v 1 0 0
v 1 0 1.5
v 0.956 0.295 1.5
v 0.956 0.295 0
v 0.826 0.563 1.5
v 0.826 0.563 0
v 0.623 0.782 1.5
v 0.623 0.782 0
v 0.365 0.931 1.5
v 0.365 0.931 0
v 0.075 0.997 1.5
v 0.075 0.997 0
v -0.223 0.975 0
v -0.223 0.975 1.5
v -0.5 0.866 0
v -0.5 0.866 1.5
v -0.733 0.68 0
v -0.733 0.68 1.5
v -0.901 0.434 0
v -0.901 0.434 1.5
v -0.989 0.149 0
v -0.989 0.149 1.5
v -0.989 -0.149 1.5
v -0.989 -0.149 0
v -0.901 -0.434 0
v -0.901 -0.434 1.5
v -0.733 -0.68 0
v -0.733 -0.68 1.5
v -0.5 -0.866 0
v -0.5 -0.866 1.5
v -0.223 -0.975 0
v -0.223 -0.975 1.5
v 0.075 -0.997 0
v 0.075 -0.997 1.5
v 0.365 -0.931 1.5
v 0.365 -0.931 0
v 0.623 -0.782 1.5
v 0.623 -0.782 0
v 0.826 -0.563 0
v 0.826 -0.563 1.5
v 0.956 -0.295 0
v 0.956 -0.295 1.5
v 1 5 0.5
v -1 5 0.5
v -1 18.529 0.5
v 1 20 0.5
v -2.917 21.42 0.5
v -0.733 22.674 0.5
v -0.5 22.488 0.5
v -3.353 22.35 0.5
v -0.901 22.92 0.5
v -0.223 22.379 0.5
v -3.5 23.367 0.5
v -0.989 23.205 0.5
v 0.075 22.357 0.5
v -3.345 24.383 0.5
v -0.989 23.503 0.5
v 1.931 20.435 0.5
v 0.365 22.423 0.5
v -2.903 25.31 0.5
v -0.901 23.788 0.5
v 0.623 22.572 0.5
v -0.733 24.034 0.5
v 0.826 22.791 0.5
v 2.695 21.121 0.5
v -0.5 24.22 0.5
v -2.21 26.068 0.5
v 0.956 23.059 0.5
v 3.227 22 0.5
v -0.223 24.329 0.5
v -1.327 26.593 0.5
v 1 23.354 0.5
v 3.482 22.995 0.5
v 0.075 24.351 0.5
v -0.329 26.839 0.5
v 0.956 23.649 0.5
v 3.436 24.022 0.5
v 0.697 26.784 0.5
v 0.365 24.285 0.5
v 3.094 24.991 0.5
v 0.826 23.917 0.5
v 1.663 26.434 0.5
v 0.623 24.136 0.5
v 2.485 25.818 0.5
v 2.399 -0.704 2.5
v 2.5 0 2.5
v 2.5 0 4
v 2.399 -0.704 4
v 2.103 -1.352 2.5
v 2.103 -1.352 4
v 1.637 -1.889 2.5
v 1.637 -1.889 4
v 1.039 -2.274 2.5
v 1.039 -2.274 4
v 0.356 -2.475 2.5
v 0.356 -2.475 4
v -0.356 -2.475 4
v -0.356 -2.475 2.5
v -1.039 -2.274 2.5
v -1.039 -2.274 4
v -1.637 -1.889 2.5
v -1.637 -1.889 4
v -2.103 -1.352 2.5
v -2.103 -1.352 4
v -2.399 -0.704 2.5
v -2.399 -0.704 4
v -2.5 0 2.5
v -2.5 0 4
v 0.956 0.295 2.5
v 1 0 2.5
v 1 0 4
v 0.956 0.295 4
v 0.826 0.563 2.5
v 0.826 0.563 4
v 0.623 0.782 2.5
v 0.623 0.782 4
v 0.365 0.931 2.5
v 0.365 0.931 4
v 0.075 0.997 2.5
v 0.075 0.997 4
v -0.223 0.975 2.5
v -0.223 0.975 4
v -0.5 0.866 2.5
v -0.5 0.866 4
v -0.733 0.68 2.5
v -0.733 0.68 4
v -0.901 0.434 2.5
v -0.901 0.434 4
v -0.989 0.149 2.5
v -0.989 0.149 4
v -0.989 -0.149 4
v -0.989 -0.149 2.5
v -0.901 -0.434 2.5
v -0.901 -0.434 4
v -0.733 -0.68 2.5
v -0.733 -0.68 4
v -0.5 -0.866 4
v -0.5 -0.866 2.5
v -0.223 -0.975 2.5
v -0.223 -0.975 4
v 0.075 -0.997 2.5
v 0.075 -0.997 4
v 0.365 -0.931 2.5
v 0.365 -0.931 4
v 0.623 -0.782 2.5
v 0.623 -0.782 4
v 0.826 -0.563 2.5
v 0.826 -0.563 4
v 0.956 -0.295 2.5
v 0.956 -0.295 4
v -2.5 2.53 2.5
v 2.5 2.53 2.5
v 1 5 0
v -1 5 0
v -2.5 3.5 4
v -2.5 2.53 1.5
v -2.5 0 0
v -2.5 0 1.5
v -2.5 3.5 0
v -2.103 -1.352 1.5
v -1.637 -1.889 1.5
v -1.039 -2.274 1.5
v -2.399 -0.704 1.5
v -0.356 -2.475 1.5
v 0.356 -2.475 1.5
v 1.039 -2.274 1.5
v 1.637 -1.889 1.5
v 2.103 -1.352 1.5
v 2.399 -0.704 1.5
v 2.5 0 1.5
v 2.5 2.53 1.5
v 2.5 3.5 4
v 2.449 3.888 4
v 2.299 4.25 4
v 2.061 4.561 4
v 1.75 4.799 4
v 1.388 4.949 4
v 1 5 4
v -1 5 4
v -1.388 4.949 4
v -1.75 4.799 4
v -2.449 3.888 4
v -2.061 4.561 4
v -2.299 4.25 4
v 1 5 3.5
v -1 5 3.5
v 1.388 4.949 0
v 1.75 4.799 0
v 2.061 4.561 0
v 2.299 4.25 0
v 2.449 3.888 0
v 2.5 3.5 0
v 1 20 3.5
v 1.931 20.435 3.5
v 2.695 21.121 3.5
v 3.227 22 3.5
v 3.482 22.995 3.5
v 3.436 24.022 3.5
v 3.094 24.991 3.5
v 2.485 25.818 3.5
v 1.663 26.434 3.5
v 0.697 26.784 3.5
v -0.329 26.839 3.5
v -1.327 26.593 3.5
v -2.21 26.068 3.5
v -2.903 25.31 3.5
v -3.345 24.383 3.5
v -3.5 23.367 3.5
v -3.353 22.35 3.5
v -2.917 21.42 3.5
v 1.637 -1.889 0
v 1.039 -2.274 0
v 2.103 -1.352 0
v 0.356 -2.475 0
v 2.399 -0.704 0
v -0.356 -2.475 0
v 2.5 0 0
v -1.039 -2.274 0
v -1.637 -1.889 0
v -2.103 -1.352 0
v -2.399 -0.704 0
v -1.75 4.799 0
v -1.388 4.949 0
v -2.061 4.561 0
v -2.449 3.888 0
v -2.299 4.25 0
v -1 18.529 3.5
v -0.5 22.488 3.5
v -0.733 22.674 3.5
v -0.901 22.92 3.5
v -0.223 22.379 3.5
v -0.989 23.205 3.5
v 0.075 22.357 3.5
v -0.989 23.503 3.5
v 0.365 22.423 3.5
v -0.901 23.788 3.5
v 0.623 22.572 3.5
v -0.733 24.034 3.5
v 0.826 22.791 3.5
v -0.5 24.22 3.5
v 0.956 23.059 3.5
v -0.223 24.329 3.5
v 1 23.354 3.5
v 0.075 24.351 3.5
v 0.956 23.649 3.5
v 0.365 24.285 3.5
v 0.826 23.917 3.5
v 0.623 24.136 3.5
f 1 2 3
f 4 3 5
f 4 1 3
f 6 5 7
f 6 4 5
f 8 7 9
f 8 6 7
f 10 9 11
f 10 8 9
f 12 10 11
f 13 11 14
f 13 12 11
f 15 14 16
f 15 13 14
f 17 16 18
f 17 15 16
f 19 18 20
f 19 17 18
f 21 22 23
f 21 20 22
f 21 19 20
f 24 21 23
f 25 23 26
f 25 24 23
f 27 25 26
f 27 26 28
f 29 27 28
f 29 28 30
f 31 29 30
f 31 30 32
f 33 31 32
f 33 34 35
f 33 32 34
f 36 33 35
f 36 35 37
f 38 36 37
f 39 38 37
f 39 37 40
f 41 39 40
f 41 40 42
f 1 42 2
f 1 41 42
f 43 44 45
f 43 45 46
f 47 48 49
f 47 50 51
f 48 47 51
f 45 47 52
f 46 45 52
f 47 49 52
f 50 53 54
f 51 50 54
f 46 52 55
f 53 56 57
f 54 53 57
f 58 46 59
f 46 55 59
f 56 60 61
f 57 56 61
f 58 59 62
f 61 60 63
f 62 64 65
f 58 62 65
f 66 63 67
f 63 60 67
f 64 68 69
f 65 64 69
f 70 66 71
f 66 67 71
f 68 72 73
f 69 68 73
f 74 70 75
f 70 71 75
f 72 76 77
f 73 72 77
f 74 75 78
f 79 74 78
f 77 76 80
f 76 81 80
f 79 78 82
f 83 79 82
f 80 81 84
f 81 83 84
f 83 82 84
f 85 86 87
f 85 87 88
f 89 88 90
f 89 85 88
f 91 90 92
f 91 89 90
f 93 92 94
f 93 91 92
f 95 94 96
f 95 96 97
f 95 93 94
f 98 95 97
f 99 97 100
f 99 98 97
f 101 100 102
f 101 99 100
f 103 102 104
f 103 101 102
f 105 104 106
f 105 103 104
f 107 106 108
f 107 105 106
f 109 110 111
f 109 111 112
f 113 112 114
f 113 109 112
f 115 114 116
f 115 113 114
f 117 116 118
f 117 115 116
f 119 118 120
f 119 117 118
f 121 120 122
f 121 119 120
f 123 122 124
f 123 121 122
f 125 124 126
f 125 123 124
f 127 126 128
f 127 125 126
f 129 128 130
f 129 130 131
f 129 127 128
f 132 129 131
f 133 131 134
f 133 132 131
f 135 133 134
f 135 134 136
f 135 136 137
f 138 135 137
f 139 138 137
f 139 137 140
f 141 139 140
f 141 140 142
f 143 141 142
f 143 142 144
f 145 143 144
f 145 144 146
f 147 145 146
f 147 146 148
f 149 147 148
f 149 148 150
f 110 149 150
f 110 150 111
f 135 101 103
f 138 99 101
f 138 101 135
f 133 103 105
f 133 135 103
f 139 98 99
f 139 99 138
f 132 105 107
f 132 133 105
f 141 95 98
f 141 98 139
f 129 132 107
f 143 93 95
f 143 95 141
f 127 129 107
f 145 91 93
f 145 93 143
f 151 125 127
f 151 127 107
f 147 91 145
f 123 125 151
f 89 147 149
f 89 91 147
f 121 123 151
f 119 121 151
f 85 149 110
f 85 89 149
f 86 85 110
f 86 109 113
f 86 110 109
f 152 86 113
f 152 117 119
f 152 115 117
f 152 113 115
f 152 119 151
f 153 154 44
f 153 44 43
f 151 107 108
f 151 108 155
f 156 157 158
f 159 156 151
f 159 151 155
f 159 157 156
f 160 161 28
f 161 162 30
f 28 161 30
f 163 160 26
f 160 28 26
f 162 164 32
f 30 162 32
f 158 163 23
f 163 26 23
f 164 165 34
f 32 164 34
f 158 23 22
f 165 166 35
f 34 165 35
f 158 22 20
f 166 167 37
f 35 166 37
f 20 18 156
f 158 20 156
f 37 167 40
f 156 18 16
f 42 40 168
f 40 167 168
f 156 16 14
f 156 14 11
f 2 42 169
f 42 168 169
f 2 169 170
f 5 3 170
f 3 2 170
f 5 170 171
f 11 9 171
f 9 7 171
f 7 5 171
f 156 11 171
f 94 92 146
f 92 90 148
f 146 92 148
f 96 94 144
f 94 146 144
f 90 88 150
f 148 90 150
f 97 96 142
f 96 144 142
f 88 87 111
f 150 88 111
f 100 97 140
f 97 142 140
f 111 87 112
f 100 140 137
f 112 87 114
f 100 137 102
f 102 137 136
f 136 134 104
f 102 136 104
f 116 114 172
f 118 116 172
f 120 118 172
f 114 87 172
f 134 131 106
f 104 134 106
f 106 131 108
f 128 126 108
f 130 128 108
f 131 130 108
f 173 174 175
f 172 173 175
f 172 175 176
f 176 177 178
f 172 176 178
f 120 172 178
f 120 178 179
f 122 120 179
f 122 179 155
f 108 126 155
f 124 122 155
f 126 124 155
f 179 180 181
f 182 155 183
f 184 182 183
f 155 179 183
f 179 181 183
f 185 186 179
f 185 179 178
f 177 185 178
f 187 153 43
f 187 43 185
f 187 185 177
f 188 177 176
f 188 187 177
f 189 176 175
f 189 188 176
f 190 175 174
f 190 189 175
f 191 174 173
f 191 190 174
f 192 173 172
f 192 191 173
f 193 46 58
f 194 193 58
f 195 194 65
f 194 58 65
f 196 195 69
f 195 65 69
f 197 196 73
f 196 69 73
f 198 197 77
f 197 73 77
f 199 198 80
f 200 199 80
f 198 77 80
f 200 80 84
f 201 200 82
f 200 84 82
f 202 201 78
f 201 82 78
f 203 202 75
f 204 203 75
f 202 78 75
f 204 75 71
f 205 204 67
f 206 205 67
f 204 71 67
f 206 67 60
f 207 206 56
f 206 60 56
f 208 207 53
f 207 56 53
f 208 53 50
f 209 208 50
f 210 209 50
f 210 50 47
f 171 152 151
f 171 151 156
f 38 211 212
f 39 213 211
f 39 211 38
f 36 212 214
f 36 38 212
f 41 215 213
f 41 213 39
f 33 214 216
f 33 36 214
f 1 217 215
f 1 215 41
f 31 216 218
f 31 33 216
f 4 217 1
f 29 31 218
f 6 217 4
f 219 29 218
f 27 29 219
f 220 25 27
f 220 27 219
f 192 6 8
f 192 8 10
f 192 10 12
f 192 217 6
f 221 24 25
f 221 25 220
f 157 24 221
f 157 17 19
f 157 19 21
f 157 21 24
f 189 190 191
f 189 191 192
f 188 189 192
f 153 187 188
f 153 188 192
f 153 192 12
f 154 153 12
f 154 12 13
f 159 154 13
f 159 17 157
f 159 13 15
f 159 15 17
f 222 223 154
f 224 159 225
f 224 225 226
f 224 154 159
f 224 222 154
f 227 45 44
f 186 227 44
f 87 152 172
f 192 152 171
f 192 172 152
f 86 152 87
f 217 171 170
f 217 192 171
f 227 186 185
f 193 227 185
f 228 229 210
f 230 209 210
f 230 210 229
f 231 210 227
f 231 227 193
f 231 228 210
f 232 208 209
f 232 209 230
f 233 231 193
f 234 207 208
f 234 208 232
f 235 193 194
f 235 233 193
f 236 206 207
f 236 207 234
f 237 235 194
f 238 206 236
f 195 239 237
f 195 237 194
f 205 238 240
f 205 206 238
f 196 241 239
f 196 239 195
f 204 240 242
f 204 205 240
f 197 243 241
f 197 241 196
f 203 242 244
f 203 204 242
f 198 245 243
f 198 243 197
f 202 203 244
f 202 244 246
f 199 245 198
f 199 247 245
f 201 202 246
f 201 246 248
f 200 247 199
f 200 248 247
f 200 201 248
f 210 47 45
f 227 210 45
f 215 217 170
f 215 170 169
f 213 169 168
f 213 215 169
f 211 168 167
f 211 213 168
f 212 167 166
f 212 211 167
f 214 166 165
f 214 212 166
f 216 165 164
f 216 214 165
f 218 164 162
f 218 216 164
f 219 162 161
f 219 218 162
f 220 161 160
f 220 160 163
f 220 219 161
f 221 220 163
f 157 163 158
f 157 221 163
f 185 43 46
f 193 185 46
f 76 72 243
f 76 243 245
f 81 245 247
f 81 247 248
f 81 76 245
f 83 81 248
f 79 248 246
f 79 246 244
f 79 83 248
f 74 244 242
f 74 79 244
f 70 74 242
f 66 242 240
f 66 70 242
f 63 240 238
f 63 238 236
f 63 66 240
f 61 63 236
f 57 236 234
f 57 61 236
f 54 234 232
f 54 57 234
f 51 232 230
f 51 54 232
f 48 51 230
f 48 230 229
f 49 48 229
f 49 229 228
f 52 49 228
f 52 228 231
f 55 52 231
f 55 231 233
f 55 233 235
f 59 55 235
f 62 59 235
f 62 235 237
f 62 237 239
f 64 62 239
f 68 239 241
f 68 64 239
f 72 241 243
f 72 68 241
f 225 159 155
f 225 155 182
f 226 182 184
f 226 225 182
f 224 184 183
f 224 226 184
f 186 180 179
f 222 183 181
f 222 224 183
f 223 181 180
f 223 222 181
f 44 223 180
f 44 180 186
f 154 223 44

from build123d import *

# Parameters (mm, degrees)
SKETCH1_R                = 1
BOSS_EXTRUDE1_DEPTH      = 4
BOSS_EXTRUDE2_DEPTH      = 1.5
BOSS_EXTRUDE2_DEPTH_BACK = 1.5
BOSS_EXTRUDE2_START      = 2
SKETCH2_R                = 1
SKETCH3_W                = 1
SKETCH3_H                = 6.076691854
CUT_EXTRUDE1_DEPTH       = 10


with BuildPart() as part:
    # Sketch1 → Boss-Extrude1 (new body)
    with BuildSketch(Plane.XY):
        with BuildLine():
            Line((-2.5, 0), (-2.5, 3.5))
            ThreePointArc((-2.5, 3.5), (-2.060660172, 4.560660172), (-1, 5))
            Line((-1, 5), (1, 5))
            ThreePointArc((1, 5), (2.060660172, 4.560660172), (2.5, 3.5))
            Line((2.5, 3.5), (2.5, 0))
            ThreePointArc((2.5, 0), (0, -2.5), (-2.5, 0))
        make_face()
        Circle(SKETCH1_R, mode=Mode.SUBTRACT)
    extrude(amount=BOSS_EXTRUDE1_DEPTH)

    # Sketch2 → Boss-Extrude2 (add, two sides: drawn at the far end of the back side and taken through both)
    with BuildSketch(Plane.XY.offset(BOSS_EXTRUDE2_START - BOSS_EXTRUDE2_DEPTH_BACK)):
        with BuildLine():
            Line((1, 5), (1, 20))
            ThreePointArc((1, 20), (1.192761143, 26.644591422), (-2.91696209, 21.419849613))
            Line((-2.91696209, 21.419849613), (-1, 18.528962219))
            Line((-1, 18.528962219), (-1, 5))
            Line((-1, 5), (1, 5))
        make_face()
        with Locations((0, 23.354101966)):
            Circle(SKETCH2_R, mode=Mode.SUBTRACT)
    extrude(amount=BOSS_EXTRUDE2_DEPTH + BOSS_EXTRUDE2_DEPTH_BACK)

    # Sketch3 → Cut-Extrude1 (cut)
    with BuildSketch(Plane(origin=(2.5, 0, 0), x_dir=(0, 0, -1), z_dir=(1, 0, 0))):
        with Locations((-2, -0.507860796)):
            Rectangle(SKETCH3_W, SKETCH3_H)
    extrude(amount=-CUT_EXTRUDE1_DEPTH, mode=Mode.SUBTRACT)


solid = part.part
